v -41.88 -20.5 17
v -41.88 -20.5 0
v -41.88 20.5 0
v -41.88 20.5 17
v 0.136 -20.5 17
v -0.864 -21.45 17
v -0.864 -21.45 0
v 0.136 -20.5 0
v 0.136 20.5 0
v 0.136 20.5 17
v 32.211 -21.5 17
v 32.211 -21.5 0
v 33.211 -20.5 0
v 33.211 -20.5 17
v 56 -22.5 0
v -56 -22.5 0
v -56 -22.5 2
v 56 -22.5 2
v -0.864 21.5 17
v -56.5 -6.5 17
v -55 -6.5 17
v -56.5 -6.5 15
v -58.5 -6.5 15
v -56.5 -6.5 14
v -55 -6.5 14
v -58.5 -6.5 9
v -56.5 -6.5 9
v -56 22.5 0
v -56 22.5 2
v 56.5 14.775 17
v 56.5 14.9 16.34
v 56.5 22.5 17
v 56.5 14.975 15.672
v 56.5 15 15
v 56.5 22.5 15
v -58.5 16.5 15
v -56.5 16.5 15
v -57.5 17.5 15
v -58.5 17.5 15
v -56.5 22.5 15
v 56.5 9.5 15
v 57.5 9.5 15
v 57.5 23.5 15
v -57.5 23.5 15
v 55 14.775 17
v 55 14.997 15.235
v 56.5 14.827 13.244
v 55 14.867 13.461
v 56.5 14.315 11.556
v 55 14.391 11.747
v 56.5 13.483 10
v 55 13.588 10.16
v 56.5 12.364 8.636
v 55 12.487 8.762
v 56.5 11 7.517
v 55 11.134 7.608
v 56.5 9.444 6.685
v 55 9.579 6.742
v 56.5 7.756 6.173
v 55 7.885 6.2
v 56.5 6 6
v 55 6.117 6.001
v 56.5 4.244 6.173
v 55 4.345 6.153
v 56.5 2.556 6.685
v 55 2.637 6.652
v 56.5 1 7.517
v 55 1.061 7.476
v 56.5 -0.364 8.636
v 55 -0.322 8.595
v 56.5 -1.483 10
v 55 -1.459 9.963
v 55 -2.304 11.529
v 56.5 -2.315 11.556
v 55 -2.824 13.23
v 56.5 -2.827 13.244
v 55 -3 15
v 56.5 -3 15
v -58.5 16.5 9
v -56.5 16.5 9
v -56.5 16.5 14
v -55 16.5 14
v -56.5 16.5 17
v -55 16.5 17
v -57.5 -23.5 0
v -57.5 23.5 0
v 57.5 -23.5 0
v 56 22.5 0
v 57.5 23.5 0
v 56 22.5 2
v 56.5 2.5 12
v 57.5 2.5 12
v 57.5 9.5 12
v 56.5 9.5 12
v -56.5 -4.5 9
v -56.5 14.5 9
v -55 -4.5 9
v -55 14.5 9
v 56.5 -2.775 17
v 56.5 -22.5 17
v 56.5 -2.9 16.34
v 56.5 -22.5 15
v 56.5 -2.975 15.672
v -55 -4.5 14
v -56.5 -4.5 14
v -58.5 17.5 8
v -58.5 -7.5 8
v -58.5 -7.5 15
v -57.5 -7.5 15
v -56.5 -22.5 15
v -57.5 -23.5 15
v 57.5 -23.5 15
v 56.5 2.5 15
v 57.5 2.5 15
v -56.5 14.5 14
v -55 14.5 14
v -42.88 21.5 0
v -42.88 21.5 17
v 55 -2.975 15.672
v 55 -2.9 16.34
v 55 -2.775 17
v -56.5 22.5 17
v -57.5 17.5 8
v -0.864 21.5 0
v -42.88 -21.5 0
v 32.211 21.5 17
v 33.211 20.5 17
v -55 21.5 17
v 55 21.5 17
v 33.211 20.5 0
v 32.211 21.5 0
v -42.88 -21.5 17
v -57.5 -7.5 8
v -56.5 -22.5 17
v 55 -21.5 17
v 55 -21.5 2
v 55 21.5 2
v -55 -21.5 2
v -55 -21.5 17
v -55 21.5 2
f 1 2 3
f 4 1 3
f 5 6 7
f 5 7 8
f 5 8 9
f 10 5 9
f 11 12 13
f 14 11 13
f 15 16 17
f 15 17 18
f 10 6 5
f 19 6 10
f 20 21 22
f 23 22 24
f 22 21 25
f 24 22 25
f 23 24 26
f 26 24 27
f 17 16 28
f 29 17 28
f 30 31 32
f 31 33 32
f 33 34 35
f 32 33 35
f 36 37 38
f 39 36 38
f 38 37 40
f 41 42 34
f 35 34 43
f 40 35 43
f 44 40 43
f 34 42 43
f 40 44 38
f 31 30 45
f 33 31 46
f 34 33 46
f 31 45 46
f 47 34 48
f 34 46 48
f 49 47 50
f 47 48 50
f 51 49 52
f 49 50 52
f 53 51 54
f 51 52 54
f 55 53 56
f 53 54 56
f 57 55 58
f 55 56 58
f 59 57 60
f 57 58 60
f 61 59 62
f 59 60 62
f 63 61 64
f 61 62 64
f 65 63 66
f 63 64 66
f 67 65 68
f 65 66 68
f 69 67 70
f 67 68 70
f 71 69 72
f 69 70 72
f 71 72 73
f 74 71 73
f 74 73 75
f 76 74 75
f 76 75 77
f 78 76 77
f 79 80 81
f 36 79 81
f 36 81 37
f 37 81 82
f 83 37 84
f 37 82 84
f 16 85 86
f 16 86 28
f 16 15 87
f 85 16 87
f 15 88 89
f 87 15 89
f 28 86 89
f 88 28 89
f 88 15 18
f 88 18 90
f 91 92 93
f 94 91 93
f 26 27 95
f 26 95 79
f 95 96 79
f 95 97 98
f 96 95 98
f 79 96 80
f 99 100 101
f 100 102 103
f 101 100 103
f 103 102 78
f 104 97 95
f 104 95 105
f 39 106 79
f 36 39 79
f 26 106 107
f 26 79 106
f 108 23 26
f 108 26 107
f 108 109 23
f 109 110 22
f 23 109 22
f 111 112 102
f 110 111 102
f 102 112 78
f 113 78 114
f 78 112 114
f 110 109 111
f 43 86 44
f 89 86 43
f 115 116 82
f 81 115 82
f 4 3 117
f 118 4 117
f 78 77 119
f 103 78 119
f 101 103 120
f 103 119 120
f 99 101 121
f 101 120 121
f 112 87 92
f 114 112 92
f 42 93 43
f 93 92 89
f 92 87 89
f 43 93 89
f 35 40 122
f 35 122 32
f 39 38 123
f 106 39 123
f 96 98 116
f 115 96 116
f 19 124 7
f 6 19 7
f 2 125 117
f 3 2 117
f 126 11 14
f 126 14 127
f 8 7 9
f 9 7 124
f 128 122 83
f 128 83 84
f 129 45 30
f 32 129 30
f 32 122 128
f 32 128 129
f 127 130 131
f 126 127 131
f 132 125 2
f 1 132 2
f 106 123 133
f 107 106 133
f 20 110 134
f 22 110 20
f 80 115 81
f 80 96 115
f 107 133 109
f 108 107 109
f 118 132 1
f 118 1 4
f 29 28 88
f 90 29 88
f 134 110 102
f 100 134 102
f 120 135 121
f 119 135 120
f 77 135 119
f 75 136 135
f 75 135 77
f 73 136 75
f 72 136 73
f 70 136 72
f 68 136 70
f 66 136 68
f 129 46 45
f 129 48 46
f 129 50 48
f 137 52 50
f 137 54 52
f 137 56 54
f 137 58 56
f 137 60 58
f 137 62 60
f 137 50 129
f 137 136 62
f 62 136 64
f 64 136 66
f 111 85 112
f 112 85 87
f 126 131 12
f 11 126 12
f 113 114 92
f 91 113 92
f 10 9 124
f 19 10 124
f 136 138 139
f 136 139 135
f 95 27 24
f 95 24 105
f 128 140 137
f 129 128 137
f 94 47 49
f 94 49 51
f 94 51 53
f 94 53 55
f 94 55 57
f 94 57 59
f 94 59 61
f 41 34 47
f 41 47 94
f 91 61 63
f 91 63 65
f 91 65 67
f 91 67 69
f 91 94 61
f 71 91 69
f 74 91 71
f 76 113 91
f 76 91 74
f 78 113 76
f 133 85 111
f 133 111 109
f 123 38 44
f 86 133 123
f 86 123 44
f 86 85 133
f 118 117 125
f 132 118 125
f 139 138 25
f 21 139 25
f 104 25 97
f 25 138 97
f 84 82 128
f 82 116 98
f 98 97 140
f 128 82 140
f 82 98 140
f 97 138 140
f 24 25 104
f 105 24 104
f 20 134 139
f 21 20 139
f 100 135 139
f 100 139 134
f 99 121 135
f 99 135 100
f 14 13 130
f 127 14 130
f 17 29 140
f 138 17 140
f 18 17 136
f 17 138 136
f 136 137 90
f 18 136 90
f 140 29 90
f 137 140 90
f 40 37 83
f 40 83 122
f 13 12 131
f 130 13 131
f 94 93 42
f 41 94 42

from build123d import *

# Parameters (mm, degrees)
F0_W      = 115
F0_H      = 47
F0_W_2    = 112
F0_H_2    = 45
F1_DEPTH  = 15
F3_W      = 113
F3_H      = 45
F3_W_2    = 110
F3_H_2    = 43
F4_DEPTH  = 15
F5_W      = 7
F5_H      = 2
F5_H_2    = 3
F6_DEPTH  = 25
F8_DEPTH  = 1.5
F9_W      = 2
F9_H      = 3
F9_W_2    = 19
F9_H_2    = 5
F10_DEPTH = 25
F12_DEPTH = 1
F13_DEPTH = 1
F15_DEPTH = 17


with BuildPart() as f1:
    # F0 (on Top) → F1 (new body)
    with BuildSketch(Plane.XY):
        Rectangle(F0_W, F0_H)
        Rectangle(F0_W_2, F0_H_2, mode=Mode.SUBTRACT)
    extrude(amount=F1_DEPTH)

    # F3 (on offset) → F4 (join)
    with BuildSketch(Plane.XY.offset(2)):
        Rectangle(F3_W, F3_H)
        Rectangle(F3_W_2, F3_H_2, mode=Mode.SUBTRACT)
    extrude(amount=F4_DEPTH)

    # F5 (on face) → F6 (cut)
    with BuildSketch(Plane.YZ.offset(57.5)):
        with Locations((6, 16)):
            Rectangle(F5_W, F5_H)
        with Locations((6, 13.5)):
            Rectangle(F5_W, F5_H_2)
    extrude(amount=-F6_DEPTH, mode=Mode.SUBTRACT)

    # F7 (on face) → F8 (cut)
    with BuildSketch(Plane(origin=(55, 0, 0), x_dir=(0, -1, 0), z_dir=(-1, 0, 0))):
        with BuildLine():
            ThreePointArc((-14.7749643874, 17), (-7.0063102189, 6.0564358479), (3, 15))
            ThreePointArc((3, 15), (2.9435641521, 16.0063102189), (2.7749643874, 17))
            Line((2.7749643874, 17), (-2.5, 17))
            Line((-2.5, 17), (-2.5, 12))
            Line((-2.5, 12), (-9.5, 12))
            Line((-9.5, 12), (-9.5, 17))
            Line((-9.5, 17), (-14.7749643874, 17))
        make_face()
        with BuildLine():
            Line((-2.5, 17), (2.7749643874, 17))
            ThreePointArc((2.7749643874, 17), (-6, 24), (-14.7749643874, 17))
            Line((-14.7749643874, 17), (-9.5, 17))
            Line((-9.5, 17), (-9.5, 12))
            Line((-9.5, 12), (-2.5, 12))
            Line((-2.5, 12), (-2.5, 17))
        make_face()
    extrude(amount=-F8_DEPTH, mode=Mode.SUBTRACT)

    # F9 (on face) → F10 (cut)
    with BuildSketch(Plane.YZ.offset(-55)):
        with Locations((-5.5, 15.5)):
            Rectangle(F9_W, F9_H)
        with Locations((5, 11.5)):
            Rectangle(F9_W_2, F9_H_2)
        with Locations((15.5, 15.5)):
            Rectangle(F9_W, F9_H)
        with Locations((5, 15.5)):
            Rectangle(F9_W_2, F9_H)
    extrude(amount=-F10_DEPTH, mode=Mode.SUBTRACT)

    # F11 (on face) → F12 (join)
    with BuildSketch(Plane(origin=(-57.5, 0, 0), x_dir=(0, -1, 0), z_dir=(-1, 0, 0))):
        Polygon((-16.5, 15), (-17.5, 15), (-17.5, 8), (7.5, 8), (7.5, 15), (6.5, 15), (6.5, 14), (6.5, 9), (4.5, 9), (-14.5, 9), (-16.5, 9), (-16.5, 14), align=None)
    extrude(amount=F12_DEPTH)

    # F13 (cut): faces of the model
    f13_faces = [f1.faces().sort_by_distance(p)[0] for p in [
        (-57.5, 15.5, 11.5),
        (-57.5, -5.5, 11.5),
    ]]
    extrude(f13_faces, amount=-F13_DEPTH, mode=Mode.SUBTRACT)


with BuildPart() as f15:
    # F14 (on Top) → F15 (new body)
    with BuildSketch(Plane.XY):
        Polygon((-41.8804898377, 20.5), (-42.8804898377, 21.5), (-42.8804898377, -21.5), (-41.8804898377, -20.5), align=None)
    extrude(amount=F15_DEPTH)


with BuildPart() as f15b:
    # F14 (on Top) → F15, piece 2 (new body)
    with BuildSketch(Plane.XY):
        Polygon((0.1358912904, 20.5), (-0.8641087096, 21.5), (-0.8641087096, -21.449737452), (0.1358912904, -20.5), align=None)
    extrude(amount=F15_DEPTH)


with BuildPart() as f15c:
    # F14 (on Top) → F15, piece 3 (new body)
    with BuildSketch(Plane.XY):
        Polygon((33.2106517851, 20.5), (32.2106517851, 21.5), (32.2106517851, -21.5), (33.2106517851, -20.5), align=None)
    extrude(amount=F15_DEPTH)


solid = Compound([f1.part, f15.part, f15b.part, f15c.part])
